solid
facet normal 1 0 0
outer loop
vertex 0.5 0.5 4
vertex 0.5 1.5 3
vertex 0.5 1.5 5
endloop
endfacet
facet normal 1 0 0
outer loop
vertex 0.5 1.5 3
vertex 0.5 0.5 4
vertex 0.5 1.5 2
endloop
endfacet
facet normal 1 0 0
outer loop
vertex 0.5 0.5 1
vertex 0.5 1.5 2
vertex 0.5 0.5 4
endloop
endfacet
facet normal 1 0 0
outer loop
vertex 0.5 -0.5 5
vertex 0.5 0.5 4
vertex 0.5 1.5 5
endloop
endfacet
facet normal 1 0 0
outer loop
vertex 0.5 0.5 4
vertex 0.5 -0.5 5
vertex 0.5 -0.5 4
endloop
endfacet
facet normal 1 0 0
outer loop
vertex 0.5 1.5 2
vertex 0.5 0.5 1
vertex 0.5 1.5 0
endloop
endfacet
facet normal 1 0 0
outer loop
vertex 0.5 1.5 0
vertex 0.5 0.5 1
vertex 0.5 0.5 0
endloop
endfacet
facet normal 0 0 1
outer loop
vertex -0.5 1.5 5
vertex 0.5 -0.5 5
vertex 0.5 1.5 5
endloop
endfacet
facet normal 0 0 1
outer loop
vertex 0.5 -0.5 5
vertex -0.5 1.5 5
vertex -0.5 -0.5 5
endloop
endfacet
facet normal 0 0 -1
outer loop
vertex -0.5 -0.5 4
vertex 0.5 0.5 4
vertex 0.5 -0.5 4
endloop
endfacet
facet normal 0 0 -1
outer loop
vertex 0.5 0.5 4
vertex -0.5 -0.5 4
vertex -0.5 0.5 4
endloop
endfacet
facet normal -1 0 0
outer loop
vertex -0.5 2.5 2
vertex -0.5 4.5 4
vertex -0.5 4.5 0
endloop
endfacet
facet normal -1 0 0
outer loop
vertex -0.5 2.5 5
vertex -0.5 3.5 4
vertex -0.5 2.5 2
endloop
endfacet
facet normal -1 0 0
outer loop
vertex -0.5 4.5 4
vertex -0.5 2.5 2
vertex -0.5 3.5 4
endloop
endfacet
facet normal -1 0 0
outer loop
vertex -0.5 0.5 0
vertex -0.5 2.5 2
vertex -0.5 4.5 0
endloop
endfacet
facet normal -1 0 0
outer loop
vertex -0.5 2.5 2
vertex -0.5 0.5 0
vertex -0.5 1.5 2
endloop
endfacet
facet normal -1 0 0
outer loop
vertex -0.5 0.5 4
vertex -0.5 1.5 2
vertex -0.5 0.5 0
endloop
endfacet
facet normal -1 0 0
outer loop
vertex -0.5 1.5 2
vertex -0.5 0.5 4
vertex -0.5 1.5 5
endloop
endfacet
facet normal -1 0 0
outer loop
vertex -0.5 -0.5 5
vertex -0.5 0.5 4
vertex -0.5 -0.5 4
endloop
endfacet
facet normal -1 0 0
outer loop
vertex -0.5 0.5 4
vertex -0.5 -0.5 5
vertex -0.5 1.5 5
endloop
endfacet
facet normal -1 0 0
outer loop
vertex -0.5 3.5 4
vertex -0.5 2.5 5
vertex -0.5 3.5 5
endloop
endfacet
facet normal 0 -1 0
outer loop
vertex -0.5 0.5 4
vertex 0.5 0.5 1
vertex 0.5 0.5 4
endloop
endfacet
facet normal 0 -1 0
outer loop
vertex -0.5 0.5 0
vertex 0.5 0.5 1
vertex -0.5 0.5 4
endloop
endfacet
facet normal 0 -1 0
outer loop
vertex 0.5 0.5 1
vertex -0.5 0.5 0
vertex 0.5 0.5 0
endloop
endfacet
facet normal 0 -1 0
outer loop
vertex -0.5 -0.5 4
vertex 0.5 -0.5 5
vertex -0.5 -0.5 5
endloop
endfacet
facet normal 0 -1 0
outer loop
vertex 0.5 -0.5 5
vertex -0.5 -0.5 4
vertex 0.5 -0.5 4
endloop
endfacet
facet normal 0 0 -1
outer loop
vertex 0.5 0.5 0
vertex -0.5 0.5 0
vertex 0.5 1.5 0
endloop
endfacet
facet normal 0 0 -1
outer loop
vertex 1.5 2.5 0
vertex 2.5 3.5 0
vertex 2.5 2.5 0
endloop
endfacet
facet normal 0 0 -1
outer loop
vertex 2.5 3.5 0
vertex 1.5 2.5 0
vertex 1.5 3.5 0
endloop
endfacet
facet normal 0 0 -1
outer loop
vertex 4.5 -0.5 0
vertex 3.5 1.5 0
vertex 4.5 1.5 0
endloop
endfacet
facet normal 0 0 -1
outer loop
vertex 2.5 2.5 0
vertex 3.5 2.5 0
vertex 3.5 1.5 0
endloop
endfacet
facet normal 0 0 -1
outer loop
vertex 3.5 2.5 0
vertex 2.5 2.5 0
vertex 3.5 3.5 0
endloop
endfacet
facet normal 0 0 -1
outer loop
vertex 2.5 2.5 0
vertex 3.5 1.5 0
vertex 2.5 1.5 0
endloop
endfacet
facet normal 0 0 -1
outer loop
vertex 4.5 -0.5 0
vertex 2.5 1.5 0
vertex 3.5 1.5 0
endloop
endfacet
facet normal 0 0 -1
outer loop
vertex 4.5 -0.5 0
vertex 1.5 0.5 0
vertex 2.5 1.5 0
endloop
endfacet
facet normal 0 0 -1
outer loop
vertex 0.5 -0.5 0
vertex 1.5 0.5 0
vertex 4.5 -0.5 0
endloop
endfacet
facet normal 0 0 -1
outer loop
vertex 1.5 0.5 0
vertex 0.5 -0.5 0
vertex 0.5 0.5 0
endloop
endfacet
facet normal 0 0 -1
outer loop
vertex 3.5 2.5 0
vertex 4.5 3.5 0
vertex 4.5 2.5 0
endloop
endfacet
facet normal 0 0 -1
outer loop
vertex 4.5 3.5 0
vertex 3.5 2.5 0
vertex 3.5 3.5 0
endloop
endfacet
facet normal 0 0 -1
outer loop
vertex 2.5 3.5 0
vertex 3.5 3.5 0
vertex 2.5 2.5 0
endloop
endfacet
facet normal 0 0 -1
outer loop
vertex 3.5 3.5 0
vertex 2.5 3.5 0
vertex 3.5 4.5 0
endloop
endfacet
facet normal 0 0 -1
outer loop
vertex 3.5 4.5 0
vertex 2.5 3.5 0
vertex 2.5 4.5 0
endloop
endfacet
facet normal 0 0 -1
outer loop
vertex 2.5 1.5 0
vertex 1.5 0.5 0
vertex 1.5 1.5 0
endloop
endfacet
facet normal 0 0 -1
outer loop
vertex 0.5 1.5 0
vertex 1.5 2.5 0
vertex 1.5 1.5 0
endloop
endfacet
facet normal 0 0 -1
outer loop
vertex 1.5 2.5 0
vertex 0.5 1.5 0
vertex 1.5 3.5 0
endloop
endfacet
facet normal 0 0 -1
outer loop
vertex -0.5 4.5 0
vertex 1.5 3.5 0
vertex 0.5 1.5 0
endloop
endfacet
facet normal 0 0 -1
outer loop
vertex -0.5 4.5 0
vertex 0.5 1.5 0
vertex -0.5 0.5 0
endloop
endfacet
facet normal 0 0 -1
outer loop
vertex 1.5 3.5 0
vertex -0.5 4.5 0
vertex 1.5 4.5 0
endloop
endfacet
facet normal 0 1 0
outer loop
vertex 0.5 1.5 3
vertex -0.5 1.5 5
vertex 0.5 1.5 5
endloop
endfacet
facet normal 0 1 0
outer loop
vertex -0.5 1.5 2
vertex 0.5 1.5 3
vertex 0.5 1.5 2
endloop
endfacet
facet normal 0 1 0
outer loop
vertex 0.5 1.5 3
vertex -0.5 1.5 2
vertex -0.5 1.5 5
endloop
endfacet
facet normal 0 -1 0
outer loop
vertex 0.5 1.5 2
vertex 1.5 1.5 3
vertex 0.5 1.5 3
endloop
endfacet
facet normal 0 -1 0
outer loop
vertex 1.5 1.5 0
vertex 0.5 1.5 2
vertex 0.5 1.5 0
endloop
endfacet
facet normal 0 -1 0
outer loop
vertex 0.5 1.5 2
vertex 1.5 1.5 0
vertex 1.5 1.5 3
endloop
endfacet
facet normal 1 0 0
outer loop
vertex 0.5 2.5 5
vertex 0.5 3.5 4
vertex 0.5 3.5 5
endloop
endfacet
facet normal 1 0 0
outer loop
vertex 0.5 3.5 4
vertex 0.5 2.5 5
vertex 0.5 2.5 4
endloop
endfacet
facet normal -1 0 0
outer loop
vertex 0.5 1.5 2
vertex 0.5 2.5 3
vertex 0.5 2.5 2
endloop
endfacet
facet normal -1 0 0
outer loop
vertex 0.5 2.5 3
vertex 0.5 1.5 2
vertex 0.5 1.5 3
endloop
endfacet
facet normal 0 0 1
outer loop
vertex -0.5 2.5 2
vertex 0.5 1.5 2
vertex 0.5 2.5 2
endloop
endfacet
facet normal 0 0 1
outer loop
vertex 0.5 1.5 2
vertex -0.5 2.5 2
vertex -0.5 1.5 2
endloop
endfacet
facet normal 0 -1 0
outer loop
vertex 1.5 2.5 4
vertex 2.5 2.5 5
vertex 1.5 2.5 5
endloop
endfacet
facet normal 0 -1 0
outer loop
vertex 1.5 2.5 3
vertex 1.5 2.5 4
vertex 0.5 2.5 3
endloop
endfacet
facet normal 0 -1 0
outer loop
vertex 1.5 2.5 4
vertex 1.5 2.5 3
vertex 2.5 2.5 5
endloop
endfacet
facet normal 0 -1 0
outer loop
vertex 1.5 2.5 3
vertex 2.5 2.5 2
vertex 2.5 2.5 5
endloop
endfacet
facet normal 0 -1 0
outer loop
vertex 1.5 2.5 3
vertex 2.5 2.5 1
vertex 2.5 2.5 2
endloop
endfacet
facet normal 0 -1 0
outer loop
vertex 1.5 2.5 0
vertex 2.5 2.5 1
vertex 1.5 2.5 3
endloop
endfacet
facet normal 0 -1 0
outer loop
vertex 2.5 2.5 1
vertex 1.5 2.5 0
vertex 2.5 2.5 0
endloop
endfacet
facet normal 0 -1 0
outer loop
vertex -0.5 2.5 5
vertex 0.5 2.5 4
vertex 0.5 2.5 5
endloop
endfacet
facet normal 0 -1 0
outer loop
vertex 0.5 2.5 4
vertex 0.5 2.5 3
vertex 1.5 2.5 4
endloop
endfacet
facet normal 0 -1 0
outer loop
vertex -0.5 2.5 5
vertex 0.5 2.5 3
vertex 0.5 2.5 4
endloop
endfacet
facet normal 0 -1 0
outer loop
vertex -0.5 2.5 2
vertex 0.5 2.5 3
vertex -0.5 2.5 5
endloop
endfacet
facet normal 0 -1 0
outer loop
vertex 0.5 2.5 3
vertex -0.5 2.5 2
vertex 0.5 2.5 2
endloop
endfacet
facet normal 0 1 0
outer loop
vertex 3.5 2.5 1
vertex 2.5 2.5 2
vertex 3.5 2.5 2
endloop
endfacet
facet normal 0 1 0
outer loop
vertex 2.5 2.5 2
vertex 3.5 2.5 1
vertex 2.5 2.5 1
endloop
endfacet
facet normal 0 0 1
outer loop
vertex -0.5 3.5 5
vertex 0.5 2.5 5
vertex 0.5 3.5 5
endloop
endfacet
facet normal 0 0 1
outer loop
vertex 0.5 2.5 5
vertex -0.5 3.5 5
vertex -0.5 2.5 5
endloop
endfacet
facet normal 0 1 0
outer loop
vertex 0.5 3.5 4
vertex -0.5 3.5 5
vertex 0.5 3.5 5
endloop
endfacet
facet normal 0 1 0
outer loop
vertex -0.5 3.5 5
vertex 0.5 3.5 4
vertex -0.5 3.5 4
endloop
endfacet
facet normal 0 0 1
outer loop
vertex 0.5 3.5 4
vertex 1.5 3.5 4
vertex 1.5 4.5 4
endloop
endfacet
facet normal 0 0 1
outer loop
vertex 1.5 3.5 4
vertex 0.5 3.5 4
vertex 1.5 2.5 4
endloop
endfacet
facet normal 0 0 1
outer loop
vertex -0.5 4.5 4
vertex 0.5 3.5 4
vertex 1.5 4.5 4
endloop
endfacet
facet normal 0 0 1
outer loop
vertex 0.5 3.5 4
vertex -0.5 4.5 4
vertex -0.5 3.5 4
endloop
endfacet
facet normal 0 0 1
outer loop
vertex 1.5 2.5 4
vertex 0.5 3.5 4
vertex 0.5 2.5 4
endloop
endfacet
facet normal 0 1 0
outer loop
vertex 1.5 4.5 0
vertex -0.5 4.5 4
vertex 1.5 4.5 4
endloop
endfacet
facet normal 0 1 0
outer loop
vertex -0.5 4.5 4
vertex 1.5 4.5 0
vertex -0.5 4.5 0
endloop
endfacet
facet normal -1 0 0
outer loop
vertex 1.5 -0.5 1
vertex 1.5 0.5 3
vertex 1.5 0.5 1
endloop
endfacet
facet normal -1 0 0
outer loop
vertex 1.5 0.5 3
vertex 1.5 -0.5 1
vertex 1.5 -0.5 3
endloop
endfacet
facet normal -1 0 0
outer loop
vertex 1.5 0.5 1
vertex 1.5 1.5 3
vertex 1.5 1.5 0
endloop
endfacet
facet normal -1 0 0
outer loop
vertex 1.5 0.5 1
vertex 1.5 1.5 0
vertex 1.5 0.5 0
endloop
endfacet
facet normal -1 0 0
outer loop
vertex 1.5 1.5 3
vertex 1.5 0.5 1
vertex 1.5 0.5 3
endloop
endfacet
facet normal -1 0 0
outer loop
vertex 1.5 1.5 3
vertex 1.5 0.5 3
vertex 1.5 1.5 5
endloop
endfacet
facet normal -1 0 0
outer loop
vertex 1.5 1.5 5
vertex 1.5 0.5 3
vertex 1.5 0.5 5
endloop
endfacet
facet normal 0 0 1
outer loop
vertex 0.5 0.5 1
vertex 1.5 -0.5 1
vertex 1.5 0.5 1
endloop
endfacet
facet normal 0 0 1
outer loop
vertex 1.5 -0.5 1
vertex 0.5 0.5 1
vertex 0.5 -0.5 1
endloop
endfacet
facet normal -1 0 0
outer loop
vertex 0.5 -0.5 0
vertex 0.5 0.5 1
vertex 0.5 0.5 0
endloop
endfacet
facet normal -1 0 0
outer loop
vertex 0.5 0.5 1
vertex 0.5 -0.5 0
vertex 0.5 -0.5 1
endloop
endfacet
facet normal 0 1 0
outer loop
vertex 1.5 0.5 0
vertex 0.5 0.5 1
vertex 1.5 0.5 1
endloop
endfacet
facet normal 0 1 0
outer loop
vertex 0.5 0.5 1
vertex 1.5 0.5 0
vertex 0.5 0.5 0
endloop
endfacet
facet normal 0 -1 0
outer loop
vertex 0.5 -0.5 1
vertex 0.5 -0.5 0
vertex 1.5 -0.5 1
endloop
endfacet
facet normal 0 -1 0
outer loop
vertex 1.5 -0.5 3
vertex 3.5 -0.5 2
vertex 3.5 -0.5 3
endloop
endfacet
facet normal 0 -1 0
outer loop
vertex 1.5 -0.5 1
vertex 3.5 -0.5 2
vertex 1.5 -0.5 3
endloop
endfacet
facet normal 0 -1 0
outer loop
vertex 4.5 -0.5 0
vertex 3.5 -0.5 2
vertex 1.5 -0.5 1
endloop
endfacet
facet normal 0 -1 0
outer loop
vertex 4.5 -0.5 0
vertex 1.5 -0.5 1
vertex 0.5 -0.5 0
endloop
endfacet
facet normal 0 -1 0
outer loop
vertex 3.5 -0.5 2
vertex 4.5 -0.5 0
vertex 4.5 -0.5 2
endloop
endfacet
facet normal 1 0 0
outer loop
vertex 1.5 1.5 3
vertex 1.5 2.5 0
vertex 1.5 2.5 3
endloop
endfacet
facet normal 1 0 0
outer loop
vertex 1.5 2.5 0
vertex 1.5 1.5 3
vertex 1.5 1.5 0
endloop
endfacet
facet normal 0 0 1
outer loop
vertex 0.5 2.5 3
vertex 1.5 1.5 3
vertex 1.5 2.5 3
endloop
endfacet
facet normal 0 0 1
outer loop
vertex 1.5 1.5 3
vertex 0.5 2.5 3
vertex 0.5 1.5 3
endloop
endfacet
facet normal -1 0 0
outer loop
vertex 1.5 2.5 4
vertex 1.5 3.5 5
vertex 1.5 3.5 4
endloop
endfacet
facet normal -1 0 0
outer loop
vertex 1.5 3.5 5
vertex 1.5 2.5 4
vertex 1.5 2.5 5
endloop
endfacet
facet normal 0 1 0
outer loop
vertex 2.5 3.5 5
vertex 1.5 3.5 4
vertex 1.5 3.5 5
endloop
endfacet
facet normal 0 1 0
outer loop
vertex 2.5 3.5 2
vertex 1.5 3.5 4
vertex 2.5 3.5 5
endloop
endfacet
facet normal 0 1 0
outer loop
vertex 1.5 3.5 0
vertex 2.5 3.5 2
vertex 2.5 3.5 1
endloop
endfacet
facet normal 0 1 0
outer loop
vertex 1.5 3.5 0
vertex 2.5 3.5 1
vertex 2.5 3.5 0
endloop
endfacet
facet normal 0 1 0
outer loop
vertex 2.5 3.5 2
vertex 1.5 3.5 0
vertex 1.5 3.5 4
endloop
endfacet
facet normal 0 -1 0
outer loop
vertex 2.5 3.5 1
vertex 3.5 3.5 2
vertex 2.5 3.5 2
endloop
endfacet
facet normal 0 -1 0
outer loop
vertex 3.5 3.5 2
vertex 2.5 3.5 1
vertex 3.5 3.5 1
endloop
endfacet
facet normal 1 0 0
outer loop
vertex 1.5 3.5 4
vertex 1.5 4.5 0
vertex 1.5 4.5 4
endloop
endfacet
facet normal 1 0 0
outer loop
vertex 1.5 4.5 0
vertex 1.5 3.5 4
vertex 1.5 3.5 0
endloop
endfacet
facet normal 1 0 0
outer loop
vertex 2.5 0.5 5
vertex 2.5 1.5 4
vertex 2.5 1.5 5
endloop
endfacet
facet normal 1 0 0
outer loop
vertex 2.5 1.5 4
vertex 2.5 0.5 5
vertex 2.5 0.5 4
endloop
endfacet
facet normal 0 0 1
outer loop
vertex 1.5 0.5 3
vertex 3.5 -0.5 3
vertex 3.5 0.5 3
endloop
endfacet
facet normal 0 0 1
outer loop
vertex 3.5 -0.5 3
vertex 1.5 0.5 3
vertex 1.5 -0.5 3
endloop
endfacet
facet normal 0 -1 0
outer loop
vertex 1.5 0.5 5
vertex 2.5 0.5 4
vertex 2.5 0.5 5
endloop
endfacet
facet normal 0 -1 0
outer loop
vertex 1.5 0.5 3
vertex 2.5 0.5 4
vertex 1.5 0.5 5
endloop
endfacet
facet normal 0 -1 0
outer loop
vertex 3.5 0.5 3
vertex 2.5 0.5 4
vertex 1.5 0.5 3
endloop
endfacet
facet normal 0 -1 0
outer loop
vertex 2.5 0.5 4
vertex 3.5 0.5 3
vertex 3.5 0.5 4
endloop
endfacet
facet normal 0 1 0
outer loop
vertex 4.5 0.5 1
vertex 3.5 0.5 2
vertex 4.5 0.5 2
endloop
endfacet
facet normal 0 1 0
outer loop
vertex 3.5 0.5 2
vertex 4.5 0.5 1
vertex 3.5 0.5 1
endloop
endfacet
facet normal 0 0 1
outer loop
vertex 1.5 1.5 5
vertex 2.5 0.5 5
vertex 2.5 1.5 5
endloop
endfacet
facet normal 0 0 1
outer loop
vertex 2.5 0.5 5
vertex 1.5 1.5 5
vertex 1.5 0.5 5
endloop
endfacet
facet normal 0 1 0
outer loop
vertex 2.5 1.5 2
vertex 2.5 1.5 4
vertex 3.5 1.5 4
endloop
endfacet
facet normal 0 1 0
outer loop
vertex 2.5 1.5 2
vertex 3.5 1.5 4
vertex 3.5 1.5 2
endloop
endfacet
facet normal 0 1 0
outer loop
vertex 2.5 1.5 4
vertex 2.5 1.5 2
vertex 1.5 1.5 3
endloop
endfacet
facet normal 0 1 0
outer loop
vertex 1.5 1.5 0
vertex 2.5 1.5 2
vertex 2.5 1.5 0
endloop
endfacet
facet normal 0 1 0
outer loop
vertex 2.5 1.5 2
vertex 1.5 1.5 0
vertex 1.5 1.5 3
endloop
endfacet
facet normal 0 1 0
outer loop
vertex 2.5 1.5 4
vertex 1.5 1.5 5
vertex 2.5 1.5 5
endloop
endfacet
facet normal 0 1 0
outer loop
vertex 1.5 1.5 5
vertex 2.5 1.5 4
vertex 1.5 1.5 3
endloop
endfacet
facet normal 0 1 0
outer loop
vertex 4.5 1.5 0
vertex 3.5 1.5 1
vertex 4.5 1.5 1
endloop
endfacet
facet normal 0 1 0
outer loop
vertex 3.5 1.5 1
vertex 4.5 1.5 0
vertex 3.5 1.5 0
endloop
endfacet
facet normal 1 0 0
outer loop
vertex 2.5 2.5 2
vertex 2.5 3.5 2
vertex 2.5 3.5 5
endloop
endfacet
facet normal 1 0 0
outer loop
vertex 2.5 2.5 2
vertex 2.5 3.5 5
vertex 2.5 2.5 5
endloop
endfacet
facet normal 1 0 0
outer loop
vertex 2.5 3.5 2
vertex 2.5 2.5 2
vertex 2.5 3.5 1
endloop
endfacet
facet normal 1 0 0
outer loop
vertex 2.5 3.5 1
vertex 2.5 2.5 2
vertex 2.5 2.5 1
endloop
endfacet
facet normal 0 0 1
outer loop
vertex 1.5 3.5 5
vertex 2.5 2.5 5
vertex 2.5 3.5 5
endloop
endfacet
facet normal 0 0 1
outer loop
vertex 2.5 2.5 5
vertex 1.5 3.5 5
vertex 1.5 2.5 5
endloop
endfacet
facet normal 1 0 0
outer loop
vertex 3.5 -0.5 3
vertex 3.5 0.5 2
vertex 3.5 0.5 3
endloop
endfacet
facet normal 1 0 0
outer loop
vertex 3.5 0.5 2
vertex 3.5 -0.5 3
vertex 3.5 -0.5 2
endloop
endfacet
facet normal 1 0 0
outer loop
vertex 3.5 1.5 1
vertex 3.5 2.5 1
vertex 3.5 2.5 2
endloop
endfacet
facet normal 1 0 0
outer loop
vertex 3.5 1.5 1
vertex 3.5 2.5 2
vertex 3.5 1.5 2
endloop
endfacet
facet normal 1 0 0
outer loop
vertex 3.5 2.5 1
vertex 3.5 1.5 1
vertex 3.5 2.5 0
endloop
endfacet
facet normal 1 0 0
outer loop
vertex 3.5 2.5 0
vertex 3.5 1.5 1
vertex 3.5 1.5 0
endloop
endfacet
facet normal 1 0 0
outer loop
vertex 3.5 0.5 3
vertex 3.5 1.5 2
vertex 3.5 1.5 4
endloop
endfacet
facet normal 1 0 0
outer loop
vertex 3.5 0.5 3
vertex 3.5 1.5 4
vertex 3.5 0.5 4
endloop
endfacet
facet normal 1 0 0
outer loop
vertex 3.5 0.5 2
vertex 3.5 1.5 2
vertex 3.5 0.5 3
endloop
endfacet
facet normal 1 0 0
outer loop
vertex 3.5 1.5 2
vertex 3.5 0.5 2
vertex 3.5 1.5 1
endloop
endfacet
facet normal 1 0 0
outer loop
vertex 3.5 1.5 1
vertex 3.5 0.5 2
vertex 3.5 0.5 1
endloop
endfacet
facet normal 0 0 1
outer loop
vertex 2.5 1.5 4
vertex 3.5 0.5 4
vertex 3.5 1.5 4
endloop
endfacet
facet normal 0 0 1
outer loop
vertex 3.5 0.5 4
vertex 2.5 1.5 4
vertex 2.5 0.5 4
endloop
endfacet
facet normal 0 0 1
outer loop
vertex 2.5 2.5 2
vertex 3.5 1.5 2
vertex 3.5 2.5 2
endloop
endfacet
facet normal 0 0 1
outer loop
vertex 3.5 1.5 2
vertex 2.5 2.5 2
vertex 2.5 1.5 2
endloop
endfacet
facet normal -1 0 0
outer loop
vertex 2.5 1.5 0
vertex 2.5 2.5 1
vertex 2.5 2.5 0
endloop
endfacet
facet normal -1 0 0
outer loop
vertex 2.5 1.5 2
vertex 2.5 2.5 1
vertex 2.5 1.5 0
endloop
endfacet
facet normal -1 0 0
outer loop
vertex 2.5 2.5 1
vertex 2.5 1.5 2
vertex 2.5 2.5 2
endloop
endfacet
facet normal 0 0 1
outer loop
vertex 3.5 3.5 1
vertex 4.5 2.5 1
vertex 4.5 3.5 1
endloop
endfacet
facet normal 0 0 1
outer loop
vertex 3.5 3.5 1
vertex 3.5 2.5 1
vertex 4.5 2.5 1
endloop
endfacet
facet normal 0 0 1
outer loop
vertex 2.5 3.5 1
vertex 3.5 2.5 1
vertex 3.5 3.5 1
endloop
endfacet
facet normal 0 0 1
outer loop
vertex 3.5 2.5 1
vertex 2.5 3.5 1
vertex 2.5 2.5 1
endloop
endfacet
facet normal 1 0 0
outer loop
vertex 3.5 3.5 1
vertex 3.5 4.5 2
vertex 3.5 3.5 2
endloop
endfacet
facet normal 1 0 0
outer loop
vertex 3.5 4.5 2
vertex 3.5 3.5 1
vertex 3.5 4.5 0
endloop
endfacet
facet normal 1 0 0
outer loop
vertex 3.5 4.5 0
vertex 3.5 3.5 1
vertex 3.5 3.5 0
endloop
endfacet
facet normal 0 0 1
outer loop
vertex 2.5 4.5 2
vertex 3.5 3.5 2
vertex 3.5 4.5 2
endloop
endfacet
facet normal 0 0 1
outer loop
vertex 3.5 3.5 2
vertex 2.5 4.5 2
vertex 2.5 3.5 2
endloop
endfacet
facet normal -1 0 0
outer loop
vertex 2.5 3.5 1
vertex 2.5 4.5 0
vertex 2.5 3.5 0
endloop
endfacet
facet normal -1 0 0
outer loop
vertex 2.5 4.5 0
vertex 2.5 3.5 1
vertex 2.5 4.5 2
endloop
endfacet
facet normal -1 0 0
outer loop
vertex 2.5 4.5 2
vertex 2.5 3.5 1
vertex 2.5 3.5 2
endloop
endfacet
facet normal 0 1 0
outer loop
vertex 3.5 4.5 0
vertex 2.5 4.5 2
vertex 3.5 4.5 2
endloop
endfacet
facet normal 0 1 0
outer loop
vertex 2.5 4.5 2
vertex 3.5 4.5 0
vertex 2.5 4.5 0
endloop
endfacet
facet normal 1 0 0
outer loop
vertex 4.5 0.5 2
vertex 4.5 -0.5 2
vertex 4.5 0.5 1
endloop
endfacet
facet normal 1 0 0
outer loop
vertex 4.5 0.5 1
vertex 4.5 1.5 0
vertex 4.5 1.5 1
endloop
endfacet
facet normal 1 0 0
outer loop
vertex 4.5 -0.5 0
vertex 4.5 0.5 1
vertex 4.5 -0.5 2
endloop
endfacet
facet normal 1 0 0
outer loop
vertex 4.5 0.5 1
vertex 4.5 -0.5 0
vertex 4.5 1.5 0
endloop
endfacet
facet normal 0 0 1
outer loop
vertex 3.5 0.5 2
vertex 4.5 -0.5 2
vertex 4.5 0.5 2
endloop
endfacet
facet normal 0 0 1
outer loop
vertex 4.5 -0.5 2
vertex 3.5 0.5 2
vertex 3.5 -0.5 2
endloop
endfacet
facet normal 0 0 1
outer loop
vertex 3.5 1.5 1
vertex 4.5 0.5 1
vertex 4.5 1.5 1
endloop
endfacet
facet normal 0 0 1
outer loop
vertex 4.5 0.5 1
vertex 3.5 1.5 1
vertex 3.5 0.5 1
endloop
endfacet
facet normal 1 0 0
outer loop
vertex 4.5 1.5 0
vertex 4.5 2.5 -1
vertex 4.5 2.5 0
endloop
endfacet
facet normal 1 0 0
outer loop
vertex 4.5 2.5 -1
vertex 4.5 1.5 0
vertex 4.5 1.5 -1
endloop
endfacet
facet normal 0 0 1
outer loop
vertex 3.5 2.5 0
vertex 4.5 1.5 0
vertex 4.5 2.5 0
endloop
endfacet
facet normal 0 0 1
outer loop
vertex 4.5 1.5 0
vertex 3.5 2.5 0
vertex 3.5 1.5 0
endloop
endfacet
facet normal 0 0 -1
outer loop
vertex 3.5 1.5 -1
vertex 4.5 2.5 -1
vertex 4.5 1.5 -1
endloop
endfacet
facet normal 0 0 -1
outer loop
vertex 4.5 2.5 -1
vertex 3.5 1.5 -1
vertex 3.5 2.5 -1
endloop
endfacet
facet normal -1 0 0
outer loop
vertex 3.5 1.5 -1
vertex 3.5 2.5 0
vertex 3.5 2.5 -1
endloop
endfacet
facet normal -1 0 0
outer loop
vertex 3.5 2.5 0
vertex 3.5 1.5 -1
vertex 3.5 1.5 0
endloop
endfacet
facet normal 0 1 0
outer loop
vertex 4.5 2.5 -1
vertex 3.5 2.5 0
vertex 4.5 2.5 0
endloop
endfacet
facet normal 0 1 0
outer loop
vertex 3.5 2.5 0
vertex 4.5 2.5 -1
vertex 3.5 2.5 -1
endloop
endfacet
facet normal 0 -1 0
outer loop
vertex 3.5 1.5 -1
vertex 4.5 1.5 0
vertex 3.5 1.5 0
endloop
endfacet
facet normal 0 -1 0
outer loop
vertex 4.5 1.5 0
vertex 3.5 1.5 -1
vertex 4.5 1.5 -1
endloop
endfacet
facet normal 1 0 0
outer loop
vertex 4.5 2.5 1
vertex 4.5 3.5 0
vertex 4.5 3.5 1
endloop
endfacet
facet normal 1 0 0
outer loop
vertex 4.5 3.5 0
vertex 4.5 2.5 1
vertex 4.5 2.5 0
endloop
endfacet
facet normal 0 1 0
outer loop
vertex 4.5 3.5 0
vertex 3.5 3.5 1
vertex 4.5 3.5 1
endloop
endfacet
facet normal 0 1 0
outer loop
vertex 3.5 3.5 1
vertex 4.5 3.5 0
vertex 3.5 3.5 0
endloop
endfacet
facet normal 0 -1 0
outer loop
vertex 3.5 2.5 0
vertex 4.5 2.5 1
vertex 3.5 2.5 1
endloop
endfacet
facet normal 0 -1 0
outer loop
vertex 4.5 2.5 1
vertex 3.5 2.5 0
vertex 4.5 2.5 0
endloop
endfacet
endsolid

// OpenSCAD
union() {
    translate([0, 0, 4.5]) color([1, 0, 0]) cube([1, 1, 1], center=true);
    translate([0, 1, 2.5]) cube([1, 1, 5], center=true);
    translate([0, 2, 1.0]) cube([1, 1, 2], center=true);
    translate([0, 3, 2.5]) cube([1, 1, 5], center=true);
    translate([0, 4, 2.0]) cube([1, 1, 4], center=true);
    translate([1, 0, 0.5]) cube([1, 1, 1], center=true);
    translate([1, 2, 1.5]) cube([1, 1, 3], center=true);
    translate([1, 3, 2.0]) cube([1, 1, 4], center=true);
    translate([1, 4, 2.0]) cube([1, 1, 4], center=true);
    translate([2, 0, 1.5]) cube([1, 1, 3], center=true);
    translate([2, 1, 2.5]) cube([1, 1, 5], center=true);
    translate([2, 3, 2.5]) cube([1, 1, 5], center=true);
    translate([3, 0, 1.5]) cube([1, 1, 3], center=true);
    translate([3, 1, 2.0]) cube([1, 1, 4], center=true);
    translate([3, 2, 1.0]) cube([1, 1, 2], center=true);
    translate([3, 3, 0.5]) cube([1, 1, 1], center=true);
    translate([3, 4, 1.0]) cube([1, 1, 2], center=true);
    translate([4, 0, 1.0]) cube([1, 1, 2], center=true);
    translate([4, 1, 0.5]) cube([1, 1, 1], center=true);
    translate([4, 2, -0.5]) color([0, 0, 1]) cube([1, 1, 1], center=true);
    translate([4, 3, 0.5]) cube([1, 1, 1], center=true);
}
